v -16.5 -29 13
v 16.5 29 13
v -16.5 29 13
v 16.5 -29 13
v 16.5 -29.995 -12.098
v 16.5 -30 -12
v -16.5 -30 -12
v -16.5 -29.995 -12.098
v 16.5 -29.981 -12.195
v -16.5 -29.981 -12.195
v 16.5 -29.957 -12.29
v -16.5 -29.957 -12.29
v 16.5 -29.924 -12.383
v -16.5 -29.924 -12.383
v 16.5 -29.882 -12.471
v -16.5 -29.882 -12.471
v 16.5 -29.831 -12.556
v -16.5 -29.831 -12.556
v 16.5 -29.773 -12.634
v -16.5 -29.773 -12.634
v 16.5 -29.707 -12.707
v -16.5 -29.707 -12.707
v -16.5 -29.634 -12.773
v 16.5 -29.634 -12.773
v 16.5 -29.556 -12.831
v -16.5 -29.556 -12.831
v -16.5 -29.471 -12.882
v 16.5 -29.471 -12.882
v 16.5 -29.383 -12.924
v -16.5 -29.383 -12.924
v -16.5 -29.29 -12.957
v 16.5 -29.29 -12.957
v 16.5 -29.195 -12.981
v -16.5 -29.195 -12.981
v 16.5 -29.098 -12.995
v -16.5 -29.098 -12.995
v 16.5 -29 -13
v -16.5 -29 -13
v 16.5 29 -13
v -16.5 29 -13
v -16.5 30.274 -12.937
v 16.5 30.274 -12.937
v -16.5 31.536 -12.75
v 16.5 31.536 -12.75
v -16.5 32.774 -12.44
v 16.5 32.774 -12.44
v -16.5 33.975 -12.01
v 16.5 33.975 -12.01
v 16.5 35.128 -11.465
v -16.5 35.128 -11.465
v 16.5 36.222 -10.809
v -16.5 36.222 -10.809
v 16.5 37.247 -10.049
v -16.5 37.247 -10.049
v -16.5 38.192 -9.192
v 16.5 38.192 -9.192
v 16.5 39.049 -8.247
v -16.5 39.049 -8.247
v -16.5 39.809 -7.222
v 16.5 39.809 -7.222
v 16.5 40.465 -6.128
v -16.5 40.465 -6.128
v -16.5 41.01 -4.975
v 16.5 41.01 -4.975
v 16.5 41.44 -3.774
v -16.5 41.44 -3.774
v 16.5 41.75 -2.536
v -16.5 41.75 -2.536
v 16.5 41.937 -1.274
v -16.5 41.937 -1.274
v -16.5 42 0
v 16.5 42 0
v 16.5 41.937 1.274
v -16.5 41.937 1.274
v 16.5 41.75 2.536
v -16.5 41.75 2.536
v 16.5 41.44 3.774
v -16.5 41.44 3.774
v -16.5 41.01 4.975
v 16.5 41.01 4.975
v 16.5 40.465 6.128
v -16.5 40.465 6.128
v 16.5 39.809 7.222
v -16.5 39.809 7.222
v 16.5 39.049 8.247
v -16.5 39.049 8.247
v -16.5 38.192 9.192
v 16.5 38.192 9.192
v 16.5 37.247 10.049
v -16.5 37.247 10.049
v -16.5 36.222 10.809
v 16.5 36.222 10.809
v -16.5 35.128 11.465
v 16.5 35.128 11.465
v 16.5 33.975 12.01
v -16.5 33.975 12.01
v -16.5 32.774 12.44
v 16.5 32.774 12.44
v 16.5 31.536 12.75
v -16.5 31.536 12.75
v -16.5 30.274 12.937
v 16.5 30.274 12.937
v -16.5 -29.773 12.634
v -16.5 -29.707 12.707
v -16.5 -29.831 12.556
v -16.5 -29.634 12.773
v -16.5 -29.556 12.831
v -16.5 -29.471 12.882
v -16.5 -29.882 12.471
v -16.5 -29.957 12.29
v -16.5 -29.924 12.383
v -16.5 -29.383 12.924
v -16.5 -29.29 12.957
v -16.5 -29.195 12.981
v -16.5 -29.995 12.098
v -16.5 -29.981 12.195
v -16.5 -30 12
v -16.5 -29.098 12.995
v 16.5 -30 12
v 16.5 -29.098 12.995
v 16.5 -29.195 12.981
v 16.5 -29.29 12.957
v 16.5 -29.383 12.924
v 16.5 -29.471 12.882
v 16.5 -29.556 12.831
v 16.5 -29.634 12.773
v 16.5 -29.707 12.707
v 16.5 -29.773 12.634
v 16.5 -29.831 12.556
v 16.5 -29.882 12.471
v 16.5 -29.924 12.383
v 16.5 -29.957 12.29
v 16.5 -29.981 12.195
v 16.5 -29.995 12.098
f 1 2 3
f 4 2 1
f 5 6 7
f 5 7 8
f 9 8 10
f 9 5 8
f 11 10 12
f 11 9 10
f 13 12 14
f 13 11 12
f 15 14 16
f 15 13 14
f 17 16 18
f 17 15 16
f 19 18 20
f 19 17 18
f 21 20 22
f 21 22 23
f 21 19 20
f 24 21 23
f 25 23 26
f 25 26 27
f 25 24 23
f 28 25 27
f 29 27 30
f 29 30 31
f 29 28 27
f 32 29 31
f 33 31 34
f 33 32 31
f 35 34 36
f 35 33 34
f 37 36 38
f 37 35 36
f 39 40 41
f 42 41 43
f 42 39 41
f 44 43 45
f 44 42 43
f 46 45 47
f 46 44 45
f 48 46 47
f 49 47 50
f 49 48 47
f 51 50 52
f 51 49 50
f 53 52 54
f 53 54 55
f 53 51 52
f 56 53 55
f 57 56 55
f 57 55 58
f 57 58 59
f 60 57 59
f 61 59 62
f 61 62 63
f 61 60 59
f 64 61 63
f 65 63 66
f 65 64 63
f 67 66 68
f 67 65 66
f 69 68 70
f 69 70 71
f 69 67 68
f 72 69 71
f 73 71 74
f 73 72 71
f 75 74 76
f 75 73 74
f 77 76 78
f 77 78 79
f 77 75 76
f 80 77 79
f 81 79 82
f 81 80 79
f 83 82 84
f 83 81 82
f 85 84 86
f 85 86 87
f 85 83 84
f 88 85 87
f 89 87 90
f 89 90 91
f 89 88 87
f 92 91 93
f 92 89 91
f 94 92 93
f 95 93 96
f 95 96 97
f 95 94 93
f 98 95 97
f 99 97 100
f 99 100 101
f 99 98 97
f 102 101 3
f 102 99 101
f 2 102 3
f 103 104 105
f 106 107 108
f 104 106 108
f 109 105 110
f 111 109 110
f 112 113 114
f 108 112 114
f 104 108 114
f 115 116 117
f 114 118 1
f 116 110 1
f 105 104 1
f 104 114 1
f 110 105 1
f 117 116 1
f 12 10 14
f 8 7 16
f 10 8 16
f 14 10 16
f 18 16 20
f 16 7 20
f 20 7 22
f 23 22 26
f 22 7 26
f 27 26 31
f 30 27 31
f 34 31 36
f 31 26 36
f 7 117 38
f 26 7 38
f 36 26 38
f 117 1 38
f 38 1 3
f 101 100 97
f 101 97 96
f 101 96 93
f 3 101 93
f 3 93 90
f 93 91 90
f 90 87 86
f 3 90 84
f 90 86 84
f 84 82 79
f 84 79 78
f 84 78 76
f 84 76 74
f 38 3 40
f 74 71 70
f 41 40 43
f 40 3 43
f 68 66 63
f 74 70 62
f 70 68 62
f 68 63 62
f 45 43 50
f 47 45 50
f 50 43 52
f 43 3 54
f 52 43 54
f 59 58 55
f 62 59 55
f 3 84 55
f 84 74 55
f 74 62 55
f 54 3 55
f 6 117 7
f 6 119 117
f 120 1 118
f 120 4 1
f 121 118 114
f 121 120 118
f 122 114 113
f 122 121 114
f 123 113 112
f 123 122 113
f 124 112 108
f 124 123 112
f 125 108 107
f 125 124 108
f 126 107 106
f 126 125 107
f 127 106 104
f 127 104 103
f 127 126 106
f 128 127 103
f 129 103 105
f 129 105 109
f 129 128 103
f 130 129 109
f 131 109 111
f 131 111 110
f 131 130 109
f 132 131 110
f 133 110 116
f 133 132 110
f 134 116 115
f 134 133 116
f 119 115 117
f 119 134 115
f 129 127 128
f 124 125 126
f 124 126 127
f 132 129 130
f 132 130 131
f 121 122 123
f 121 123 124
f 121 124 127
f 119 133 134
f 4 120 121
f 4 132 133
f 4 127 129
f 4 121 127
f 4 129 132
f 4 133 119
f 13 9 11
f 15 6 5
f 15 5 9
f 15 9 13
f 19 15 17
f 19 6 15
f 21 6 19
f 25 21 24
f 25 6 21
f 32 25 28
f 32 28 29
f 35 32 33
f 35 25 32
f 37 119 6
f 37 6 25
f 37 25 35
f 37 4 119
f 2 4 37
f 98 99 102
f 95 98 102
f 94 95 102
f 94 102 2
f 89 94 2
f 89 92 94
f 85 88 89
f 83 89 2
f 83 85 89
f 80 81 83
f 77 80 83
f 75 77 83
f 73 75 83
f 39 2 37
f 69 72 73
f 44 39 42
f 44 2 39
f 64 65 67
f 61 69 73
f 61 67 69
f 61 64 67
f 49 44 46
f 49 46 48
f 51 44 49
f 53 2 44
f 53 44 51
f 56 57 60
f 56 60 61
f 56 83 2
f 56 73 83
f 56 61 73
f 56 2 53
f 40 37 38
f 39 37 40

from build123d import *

# Parameters (mm, degrees)
SALIENTE_EXTRUIR4_DEPTH = 16.5


with BuildPart() as part:
    # Croquis1 → Saliente-Extruir4 (new, symmetric)
    with BuildSketch(Plane(origin=(0, 0, 0), x_dir=(0, 0, -1), z_dir=(1, 0, 0))):
        with BuildLine():
            Line((-12, -30), (12, -30))
            ThreePointArc((12, -30), (12.707106781, -29.707106781), (13, -29))
            Line((13, -29), (13, 29))
            ThreePointArc((13, 29), (0, 42), (-13, 29))
            Line((-13, 29), (-13, -29))
            ThreePointArc((-13, -29), (-12.707106781, -29.707106781), (-12, -30))
        make_face()
    extrude(amount=SALIENTE_EXTRUIR4_DEPTH, both=True)


solid = part.part
